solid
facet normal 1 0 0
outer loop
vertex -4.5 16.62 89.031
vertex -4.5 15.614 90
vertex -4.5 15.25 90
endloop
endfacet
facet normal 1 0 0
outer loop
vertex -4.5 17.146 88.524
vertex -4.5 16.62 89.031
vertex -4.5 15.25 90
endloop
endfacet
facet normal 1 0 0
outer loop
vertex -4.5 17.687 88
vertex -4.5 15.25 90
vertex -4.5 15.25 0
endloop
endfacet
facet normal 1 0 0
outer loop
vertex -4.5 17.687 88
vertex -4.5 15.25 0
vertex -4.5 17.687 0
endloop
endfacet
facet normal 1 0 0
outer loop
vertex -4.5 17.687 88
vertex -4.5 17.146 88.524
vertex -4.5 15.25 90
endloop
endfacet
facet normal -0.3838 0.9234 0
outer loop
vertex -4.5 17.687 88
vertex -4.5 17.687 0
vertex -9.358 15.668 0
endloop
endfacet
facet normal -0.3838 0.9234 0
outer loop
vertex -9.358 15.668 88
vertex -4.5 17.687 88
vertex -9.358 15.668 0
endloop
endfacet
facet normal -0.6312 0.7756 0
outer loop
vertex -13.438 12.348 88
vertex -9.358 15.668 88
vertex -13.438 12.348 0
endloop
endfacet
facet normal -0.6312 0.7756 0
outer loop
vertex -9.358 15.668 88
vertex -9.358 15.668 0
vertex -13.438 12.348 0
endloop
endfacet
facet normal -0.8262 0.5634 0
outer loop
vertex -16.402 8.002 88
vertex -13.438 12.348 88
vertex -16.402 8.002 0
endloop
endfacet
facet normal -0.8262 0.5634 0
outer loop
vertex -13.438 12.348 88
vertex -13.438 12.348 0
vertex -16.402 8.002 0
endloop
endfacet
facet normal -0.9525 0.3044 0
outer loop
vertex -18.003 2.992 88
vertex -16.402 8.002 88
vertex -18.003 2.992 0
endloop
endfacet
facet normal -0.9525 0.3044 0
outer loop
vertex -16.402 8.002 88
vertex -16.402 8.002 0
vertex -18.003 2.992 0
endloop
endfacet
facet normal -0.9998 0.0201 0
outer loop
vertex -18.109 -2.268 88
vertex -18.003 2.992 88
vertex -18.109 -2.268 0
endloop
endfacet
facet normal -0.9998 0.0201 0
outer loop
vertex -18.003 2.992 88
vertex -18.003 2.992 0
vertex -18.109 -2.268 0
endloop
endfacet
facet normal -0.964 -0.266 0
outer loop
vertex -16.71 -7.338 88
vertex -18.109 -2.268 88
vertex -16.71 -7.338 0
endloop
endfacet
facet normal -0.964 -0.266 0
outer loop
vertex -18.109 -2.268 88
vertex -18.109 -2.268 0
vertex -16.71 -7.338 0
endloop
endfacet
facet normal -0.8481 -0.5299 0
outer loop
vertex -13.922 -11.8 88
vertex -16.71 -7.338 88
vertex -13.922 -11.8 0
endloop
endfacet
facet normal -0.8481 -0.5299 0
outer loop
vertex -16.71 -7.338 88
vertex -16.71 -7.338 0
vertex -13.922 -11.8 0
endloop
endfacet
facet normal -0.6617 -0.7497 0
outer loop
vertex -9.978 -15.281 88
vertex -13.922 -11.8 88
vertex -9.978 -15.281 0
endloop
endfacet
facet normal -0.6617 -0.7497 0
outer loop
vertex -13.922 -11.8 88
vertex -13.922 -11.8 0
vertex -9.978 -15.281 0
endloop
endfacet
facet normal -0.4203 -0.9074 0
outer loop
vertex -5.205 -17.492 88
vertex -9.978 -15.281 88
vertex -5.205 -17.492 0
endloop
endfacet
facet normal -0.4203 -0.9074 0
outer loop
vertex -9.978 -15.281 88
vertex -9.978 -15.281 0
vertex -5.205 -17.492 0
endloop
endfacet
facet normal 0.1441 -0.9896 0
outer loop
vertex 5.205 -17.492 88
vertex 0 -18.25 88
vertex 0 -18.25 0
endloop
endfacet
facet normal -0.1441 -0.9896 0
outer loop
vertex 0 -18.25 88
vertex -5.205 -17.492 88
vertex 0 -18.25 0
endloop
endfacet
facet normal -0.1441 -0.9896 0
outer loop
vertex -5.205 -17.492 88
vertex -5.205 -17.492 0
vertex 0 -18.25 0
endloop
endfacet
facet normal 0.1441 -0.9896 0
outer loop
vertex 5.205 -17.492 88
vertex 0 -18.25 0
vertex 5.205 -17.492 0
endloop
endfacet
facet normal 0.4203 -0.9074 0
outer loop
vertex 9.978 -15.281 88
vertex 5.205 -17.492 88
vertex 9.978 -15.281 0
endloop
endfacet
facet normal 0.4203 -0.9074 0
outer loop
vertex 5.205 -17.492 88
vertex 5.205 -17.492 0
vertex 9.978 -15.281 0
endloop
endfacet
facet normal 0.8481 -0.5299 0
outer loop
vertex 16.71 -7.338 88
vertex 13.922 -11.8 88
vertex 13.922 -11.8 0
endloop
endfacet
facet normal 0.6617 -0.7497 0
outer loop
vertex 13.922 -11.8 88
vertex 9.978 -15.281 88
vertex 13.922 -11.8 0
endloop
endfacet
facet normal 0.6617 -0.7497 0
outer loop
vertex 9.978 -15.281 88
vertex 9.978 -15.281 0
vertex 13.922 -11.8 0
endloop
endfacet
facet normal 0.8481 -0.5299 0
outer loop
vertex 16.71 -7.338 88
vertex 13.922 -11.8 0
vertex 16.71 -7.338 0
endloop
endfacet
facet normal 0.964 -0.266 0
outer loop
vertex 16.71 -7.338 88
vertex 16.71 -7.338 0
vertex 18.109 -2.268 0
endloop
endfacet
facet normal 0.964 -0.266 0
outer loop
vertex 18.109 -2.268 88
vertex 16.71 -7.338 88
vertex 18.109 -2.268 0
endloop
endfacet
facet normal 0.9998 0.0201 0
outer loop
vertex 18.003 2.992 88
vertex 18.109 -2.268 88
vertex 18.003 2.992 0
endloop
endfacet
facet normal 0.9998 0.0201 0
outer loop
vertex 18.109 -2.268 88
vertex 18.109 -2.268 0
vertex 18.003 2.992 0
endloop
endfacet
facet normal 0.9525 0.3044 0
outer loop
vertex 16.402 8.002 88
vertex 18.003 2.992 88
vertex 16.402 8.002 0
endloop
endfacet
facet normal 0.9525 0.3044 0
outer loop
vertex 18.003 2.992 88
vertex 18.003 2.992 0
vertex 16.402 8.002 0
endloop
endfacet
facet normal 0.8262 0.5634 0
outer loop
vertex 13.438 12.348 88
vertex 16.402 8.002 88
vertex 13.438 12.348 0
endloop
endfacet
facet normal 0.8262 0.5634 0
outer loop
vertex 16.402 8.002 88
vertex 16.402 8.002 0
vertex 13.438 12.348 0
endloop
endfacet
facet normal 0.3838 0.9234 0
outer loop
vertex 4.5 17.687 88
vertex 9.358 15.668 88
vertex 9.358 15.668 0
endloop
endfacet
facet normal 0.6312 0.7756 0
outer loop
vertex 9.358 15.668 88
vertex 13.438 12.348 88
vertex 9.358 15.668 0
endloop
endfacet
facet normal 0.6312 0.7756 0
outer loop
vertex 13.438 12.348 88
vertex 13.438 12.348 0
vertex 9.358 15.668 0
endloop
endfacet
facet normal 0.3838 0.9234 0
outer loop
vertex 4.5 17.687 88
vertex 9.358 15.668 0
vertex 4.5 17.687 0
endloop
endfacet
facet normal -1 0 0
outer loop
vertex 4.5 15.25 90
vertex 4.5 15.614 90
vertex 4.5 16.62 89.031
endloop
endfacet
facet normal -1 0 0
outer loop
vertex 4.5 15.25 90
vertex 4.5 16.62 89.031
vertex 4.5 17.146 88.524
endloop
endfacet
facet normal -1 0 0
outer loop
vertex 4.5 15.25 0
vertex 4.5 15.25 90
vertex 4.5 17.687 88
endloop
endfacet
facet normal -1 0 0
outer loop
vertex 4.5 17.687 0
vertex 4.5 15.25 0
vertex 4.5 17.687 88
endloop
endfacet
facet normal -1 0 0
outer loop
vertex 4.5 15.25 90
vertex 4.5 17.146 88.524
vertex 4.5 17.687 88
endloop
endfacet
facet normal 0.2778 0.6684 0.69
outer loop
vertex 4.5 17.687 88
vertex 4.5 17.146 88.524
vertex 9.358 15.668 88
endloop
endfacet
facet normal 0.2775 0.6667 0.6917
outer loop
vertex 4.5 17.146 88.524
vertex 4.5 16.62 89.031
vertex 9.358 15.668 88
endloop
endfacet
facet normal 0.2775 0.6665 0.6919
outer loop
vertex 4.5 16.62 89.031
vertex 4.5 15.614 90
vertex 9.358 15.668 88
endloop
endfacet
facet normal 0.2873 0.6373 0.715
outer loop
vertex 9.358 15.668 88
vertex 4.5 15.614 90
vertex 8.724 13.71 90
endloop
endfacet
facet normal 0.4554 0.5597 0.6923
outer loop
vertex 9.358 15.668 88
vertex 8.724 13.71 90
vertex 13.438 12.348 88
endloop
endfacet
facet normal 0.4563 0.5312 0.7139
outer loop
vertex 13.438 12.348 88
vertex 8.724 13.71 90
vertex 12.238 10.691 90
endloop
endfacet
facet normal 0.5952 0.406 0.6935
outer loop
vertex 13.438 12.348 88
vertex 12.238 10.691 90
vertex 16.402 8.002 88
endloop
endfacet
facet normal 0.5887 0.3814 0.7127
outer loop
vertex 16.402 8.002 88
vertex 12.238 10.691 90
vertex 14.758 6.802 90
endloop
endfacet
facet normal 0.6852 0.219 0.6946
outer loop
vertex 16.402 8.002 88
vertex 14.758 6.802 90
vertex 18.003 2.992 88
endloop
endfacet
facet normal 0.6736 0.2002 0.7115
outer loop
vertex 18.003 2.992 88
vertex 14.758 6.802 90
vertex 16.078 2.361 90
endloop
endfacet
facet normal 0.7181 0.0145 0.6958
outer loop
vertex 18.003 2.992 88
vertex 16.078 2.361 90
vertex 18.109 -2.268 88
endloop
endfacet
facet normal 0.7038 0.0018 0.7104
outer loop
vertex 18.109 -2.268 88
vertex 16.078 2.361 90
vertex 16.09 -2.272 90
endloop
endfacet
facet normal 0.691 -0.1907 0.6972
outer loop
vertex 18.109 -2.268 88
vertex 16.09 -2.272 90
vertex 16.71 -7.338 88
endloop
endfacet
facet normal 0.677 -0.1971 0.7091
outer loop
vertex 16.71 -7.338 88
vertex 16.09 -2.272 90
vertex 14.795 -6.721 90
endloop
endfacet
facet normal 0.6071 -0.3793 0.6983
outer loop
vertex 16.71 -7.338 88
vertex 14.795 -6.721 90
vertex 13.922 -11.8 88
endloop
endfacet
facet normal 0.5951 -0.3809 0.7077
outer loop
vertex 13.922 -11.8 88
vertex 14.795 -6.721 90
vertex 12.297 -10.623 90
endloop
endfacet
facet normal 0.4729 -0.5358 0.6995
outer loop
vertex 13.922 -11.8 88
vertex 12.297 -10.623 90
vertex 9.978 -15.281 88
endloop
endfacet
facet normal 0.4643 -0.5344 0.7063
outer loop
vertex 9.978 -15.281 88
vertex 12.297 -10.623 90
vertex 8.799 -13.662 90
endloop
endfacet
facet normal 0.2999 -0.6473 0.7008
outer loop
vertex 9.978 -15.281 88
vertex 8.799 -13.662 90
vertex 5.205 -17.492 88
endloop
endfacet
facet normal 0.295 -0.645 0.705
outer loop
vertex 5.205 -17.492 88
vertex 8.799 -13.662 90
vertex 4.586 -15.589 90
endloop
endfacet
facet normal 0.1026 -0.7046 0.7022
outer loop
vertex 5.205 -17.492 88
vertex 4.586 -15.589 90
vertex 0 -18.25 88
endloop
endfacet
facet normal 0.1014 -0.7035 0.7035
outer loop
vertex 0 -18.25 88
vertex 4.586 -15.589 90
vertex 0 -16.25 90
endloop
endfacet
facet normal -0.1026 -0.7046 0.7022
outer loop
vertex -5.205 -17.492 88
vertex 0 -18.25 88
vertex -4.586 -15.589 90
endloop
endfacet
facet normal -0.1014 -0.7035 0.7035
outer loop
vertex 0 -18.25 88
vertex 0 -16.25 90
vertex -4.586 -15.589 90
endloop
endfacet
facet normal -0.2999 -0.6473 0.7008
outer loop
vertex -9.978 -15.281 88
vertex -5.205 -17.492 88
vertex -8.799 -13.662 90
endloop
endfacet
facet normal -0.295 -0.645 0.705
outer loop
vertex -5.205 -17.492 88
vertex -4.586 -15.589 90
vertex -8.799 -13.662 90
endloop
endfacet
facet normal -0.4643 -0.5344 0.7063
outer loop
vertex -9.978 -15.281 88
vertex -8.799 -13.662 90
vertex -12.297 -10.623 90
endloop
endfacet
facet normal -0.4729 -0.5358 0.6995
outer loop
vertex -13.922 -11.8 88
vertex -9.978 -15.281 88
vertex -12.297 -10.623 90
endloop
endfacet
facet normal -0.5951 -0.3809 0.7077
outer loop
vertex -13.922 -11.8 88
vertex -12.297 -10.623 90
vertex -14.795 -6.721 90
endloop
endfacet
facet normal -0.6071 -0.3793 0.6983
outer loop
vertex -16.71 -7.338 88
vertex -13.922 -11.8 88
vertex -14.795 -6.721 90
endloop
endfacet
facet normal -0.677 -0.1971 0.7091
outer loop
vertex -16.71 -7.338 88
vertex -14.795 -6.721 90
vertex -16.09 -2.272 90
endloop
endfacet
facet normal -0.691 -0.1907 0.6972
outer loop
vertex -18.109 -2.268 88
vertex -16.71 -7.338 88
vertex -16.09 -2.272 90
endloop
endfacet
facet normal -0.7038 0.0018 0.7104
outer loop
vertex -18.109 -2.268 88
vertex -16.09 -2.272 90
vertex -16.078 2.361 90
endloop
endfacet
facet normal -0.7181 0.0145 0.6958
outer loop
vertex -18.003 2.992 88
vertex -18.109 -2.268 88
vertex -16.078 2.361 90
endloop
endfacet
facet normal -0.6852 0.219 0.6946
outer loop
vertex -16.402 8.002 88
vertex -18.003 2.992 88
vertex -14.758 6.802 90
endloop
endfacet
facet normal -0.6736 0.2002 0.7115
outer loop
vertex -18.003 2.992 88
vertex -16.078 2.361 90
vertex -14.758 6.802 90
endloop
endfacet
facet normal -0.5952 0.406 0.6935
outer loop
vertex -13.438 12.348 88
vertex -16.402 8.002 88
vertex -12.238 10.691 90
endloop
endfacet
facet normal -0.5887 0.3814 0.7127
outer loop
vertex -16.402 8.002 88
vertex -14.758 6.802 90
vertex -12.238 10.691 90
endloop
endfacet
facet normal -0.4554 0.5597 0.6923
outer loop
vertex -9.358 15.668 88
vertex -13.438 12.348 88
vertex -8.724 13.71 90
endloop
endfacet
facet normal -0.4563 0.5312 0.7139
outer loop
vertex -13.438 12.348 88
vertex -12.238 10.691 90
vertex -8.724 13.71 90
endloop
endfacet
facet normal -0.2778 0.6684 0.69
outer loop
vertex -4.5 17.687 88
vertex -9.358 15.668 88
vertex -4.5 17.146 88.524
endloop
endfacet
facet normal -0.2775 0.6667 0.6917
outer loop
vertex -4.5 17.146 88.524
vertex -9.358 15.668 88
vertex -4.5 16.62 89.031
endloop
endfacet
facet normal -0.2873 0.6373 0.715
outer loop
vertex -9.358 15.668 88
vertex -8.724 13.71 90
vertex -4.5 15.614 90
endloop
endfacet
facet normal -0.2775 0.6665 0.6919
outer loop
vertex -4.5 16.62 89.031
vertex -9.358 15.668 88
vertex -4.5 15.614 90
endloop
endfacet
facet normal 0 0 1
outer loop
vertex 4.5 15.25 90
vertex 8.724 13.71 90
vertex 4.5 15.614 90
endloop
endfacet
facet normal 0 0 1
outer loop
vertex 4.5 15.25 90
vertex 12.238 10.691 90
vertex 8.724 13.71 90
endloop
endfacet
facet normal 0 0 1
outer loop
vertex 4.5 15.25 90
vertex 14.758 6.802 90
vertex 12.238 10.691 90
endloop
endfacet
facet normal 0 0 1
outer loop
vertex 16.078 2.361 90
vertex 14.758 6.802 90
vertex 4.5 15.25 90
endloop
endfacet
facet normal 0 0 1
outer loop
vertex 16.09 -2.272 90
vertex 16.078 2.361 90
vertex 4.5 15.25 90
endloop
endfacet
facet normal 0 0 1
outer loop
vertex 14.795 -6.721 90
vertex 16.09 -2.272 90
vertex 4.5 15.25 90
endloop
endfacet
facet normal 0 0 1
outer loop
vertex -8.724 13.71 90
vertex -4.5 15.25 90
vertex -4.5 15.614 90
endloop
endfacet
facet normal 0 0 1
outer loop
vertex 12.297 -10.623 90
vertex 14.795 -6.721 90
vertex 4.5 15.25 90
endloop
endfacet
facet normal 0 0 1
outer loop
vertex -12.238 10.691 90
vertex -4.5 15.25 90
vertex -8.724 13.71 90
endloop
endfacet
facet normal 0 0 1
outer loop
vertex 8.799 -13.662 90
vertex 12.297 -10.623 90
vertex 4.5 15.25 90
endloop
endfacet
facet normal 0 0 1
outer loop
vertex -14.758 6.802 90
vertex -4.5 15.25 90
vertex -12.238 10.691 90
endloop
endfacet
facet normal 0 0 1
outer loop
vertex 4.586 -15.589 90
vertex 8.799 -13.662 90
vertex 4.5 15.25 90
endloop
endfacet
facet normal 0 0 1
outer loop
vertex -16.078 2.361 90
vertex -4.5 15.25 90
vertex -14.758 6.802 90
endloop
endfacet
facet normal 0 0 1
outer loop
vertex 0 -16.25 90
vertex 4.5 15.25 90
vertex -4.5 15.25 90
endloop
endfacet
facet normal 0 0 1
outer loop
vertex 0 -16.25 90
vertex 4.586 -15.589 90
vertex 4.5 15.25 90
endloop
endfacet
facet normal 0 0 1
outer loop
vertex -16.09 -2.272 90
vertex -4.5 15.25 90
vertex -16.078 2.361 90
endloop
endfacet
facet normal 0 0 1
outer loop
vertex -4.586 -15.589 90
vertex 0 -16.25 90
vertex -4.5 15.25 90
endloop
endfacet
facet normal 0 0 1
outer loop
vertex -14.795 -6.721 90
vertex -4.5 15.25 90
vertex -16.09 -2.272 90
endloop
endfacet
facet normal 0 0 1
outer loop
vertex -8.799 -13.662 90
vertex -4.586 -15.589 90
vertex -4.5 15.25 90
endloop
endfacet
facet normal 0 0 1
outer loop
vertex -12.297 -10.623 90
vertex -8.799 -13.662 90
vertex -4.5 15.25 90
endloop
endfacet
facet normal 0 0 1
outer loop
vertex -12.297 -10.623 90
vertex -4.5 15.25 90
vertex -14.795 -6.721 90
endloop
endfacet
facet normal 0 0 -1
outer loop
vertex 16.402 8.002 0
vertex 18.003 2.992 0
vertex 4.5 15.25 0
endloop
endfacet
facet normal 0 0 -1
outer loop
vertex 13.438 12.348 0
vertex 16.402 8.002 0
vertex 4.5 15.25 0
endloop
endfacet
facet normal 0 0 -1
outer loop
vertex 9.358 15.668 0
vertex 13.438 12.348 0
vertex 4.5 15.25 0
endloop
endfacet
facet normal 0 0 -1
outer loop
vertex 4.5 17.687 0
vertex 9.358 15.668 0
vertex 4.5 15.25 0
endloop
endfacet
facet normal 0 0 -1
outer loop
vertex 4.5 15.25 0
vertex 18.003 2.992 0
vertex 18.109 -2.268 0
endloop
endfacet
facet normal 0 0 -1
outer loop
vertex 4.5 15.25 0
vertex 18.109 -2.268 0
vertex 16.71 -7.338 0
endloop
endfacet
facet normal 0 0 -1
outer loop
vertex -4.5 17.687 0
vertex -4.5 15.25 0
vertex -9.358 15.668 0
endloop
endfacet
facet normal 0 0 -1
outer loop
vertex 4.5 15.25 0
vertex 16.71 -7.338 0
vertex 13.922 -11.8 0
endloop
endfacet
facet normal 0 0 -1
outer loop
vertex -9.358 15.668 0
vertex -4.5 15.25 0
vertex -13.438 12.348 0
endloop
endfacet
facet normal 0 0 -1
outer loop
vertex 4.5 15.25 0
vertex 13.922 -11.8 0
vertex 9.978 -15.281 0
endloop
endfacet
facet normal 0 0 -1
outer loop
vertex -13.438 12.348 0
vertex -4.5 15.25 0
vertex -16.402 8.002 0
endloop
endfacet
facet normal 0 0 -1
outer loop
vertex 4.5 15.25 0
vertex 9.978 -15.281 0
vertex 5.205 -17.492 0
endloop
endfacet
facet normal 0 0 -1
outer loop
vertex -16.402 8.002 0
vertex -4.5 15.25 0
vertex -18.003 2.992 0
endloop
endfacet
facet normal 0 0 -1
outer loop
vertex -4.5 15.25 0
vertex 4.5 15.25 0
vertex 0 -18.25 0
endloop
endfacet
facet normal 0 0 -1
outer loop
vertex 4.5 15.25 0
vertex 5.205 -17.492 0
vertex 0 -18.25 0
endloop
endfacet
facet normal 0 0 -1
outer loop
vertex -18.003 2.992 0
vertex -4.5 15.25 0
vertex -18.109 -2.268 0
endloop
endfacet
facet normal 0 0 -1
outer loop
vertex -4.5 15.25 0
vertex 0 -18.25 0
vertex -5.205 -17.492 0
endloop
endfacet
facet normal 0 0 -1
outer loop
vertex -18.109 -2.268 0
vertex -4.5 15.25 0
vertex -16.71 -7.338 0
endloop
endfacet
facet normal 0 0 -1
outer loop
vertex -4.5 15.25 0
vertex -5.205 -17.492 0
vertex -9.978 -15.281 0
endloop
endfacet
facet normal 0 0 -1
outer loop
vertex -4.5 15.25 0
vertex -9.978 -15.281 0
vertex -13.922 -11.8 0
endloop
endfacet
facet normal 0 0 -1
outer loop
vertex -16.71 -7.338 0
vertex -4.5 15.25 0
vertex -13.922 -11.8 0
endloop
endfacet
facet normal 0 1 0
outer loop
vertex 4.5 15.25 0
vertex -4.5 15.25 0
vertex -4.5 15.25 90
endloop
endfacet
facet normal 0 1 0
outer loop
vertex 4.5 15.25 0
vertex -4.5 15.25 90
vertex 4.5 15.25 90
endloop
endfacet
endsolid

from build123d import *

# Parameters (mm, degrees)
SKETCH1_R           = 18.25
BOSS_EXTRUDE1_DEPTH = 90
SKETCH2_W           = 9
SKETCH2_H           = 6
CUT_EXTRUDE1_DEPTH  = 94.627586747
CHAMFER1_SIZE       = 2


with BuildPart() as part:
    # Sketch1 → Boss-Extrude1 (new body)
    with BuildSketch(Plane.XY):
        with Locations(Location((0, 0, 0), (0, 0, 180))):
            Circle(SKETCH1_R)
    extrude(amount=BOSS_EXTRUDE1_DEPTH)

    # Sketch2 → Cut-Extrude1 (cut, through all)
    with BuildSketch(Plane.XY.offset(90)):
        with Locations((0, 18.25)):
            Rectangle(SKETCH2_W, SKETCH2_H)
    extrude(amount=-CUT_EXTRUDE1_DEPTH, mode=Mode.SUBTRACT)

    # Chamfer1
    chamfer1_edges = [part.edges().sort_by_distance(p)[0] for p in [
        (0, -18.25, 90),
    ]]
    chamfer(chamfer1_edges, length=CHAMFER1_SIZE)


solid = part.part
